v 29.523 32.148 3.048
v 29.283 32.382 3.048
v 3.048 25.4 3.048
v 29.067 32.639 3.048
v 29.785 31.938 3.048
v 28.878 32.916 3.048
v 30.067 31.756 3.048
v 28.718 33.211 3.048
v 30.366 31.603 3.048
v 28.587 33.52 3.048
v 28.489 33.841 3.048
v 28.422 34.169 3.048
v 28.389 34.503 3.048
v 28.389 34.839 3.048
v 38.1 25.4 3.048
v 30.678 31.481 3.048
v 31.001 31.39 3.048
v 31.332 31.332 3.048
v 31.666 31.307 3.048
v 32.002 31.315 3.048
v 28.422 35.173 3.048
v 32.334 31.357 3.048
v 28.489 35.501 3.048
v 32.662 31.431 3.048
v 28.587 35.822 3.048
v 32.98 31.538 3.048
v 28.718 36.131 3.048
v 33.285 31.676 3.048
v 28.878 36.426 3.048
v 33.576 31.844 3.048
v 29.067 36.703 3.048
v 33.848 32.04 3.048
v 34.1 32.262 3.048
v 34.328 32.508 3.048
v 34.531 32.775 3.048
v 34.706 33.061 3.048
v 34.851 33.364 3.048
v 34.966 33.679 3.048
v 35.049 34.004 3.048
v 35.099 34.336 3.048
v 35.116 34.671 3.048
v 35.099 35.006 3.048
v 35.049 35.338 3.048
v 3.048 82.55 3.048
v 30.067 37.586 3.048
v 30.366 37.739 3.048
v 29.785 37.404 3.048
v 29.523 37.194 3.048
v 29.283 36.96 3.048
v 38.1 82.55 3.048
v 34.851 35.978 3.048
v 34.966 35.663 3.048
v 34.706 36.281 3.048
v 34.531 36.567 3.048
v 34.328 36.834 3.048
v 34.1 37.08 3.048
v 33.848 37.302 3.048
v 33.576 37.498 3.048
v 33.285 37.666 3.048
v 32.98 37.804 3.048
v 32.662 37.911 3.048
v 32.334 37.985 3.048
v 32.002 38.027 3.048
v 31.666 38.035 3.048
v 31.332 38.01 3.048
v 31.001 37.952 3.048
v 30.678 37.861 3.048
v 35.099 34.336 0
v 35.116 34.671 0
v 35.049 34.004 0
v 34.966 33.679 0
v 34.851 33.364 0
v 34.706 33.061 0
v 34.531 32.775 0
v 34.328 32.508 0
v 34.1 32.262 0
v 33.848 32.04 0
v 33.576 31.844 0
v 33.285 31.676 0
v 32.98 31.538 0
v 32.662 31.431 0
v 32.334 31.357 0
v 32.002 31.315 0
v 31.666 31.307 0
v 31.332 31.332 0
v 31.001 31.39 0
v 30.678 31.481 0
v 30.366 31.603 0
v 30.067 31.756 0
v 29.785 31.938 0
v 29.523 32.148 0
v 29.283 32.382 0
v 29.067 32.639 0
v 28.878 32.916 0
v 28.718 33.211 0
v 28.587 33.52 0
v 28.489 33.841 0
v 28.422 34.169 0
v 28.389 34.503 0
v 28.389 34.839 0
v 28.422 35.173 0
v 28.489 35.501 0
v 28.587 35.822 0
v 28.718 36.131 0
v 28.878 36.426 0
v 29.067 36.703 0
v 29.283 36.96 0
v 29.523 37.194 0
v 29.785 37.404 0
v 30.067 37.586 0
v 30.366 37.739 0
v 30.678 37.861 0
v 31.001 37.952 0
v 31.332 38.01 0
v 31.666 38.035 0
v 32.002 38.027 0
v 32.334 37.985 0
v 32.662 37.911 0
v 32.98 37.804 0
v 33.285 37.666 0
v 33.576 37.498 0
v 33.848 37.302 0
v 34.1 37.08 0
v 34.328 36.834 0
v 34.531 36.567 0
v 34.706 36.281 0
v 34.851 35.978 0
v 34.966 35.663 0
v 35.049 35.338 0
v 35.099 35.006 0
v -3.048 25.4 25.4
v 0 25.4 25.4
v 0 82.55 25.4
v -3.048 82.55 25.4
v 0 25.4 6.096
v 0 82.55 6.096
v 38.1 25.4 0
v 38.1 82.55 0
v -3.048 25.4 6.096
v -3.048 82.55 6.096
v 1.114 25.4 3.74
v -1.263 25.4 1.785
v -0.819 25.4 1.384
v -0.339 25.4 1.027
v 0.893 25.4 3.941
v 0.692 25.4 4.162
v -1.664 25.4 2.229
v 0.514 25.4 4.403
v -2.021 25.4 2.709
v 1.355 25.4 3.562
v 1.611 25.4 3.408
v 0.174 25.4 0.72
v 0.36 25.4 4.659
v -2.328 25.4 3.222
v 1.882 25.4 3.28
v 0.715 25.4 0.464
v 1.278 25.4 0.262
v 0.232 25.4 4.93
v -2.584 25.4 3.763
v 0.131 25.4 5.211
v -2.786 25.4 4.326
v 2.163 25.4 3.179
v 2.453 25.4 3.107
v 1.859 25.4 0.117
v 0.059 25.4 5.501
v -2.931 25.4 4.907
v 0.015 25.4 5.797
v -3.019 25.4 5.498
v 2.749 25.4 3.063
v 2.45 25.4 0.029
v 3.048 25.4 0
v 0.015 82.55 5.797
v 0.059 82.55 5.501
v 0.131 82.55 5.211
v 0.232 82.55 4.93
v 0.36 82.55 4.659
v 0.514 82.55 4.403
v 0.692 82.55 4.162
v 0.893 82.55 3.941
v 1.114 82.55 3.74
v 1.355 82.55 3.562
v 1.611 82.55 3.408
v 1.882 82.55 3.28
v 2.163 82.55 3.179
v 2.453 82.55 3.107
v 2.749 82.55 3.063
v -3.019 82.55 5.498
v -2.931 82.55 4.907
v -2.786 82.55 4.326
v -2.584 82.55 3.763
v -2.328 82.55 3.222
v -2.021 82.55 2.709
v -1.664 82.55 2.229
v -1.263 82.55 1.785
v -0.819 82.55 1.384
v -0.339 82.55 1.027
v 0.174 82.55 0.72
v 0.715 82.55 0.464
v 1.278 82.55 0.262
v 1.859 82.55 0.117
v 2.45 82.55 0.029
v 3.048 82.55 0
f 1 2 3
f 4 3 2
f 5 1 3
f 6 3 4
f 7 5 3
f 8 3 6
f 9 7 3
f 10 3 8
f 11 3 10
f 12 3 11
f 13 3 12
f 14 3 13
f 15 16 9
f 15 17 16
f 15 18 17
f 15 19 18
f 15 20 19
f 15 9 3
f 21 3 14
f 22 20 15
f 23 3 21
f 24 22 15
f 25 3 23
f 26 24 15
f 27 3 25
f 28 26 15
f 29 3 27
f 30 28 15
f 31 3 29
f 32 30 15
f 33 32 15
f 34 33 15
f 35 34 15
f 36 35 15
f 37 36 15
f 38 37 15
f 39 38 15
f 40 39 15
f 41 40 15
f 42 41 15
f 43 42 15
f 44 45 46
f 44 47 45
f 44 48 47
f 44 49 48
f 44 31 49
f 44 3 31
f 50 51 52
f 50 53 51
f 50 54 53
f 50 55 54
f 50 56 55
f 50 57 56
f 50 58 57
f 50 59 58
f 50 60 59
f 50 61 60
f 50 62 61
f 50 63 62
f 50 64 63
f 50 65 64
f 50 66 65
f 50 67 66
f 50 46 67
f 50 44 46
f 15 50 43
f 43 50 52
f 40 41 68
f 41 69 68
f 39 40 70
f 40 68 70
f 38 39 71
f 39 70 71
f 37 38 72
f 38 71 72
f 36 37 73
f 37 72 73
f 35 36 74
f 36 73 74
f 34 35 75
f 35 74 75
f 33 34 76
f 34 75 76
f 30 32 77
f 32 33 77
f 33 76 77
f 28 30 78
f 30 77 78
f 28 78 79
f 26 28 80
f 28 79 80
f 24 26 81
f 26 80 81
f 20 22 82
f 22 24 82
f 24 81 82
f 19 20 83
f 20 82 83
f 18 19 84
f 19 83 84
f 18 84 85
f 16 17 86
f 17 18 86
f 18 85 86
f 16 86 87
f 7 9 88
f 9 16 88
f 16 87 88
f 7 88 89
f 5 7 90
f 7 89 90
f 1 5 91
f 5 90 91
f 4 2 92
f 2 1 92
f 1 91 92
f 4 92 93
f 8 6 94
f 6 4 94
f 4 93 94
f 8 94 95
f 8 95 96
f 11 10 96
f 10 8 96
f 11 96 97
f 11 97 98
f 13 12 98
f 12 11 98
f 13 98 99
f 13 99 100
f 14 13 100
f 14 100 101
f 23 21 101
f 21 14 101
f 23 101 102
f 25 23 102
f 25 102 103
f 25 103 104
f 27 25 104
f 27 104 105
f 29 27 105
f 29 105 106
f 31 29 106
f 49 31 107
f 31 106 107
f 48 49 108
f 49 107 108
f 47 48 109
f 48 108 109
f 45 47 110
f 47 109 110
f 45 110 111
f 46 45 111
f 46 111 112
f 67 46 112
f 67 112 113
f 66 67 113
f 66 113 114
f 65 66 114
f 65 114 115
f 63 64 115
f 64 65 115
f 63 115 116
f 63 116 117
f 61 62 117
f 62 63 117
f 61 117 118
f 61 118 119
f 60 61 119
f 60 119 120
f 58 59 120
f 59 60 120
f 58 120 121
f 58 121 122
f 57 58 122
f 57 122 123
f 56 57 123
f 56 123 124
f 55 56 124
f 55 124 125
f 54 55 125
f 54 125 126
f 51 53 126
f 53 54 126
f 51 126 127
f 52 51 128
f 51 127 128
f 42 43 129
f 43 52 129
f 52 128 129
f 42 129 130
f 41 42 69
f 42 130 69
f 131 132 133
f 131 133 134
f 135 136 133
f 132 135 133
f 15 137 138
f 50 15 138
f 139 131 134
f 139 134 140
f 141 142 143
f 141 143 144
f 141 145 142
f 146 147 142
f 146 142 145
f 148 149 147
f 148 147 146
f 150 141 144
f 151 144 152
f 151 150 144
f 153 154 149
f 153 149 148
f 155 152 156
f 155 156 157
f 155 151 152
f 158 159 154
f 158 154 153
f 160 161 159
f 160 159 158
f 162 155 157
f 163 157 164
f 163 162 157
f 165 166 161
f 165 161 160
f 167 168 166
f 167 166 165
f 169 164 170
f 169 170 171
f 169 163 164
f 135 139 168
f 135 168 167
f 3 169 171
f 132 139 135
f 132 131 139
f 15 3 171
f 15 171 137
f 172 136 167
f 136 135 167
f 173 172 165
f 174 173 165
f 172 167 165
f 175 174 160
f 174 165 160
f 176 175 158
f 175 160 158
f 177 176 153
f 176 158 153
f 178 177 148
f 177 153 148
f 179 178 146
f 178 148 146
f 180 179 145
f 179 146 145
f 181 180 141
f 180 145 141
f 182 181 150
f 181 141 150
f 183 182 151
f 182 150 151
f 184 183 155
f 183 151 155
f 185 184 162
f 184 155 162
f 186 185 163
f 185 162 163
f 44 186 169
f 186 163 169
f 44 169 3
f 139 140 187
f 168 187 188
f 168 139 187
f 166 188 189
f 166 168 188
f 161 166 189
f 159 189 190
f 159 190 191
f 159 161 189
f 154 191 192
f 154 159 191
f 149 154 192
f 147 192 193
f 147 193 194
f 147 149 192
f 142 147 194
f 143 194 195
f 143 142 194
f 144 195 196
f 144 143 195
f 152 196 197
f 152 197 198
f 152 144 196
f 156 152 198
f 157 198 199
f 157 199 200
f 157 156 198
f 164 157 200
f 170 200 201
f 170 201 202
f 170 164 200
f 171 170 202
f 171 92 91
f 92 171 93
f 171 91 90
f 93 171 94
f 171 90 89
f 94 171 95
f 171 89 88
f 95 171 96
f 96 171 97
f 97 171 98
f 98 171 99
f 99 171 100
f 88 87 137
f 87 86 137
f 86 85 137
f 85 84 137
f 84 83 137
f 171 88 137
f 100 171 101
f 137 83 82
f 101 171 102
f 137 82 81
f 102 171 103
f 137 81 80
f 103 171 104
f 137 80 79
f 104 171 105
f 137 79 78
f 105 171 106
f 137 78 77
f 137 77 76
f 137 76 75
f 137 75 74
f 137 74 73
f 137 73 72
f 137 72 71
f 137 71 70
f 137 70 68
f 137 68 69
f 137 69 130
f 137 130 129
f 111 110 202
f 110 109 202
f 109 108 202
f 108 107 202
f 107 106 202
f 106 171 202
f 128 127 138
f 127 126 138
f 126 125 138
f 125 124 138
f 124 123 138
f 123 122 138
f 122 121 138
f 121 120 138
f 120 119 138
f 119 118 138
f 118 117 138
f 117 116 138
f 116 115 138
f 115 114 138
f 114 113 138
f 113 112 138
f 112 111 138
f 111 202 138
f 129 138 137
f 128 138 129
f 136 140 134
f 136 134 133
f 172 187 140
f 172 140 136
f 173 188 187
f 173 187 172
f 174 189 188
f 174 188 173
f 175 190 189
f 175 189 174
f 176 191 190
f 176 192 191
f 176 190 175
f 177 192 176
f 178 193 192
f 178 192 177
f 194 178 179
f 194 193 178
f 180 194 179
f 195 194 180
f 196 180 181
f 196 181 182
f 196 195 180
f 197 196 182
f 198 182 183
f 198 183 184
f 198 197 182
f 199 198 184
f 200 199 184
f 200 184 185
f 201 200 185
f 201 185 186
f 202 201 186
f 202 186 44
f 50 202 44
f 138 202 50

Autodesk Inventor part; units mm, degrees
ref_plane "YZ Plane" through (0, 0, 0) normal (1, 0, 0) x (0, 1, 0)
ref_plane "XZ Plane" through (0, 0, 0) normal (0, 1, 0) x (-1, 0, 0)
ref_plane "XY Plane" through (0, 0, 0) normal (0, 0, 1) x (1, 0, 0)
sketch "Sketch1" plane through (0, 0, 0) normal (0, 0, 1) x (1, 0, 0)
  line L0 (0, 0) -> (38.1, 0)
  line L1 (38.1, 0) -> (38.1, 253.0348)
  arc A0 (38.1, 507.0348) -> (38.1, 253.0348) centre (666.75, 380.0348) ccw
  line L2 (38.1, 507.0348) -> (38.1, 608.6348)
  line L3 (38.1, 608.6348) -> (0, 608.6348)
  line L4 (0, 608.6348) -> (0, 0)
  circle A1 centre (31.75, 151.4348) radius 3.3655
  circle A2 centre (31.75, 34.671) radius 3.3655
  circle A3 centre (12.7, 12.7) radius 3.3655
  circle A4 centre (12.7, 342.9) radius 3.3655
  circle A5 centre (12.7, 595.9348) radius 3.3655
  circle A6 centre (31.75, 12.7) radius 3.3655
  circle A7 centre (31.75, 253.0348) radius 3.3655
  circle A8 centre (31.75, 507.0348) radius 3.3655
  circle A9 centre (31.75, 595.9348) radius 3.3655
  line L5 (0, 557.8348) -> (0, 608.6348)
  line L6 (0, 50.8) -> (0, 0)
  line L7 (12.7, 342.9) -> (0, 304.3174) construction
  line L8 (0, 317.5) -> (0, 368.3)
  line L9 (0, 129.921) -> (12.7, 129.921) construction
  circle A10 centre (12.7, 129.921) radius 3.3655
  circle A11 centre (12.7, 174.371) radius 3.3655
  line L10 (9.3413, 197.482) -> (9.3413, 204.213)
  line L11 (16.0611, 204.488) -> (16.0611, 197.3435)
  arc A12 (16.0611, 204.488) -> (9.3413, 204.213) centre (12.6956, 204.488) ccw
  arc A13 (9.3413, 197.482) -> (16.0611, 197.3435) centre (12.6974, 197.231) ccw
  circle A14 centre (12.7, 217.188) radius 3.3655
  dimension "d0" = 38.1
  dimension "d2" = 101.6
  dimension "d4" = 457.2
  dimension "d5" = 101.6
  dimension "d6" = 666.75
  dimension "d7" = 641.35
  dimension "d9" = 116.7638
  dimension "d10" = 6.35
  dimension "d11" = 6.35
  dimension "d13" = 12.7
  dimension "d14" = 12.7
  dimension "d16" = 12.7
  dimension "d17" = 342.9
  dimension "d19" = 12.7
  dimension "d20" = 12.7
  dimension "d22" = 6.35
  dimension "d24" = 6.35
  dimension "d25" = 6.731
  dimension "d26" = 6.35
  dimension "hole" = 6.731
  dimension "d28" = 6.35
  dimension "d45" = 12.7
  dimension "d47" = 12.7
  dimension "d54" = 6.731
  dimension "d55" = 3.3655
  dimension "d56" = 3.3655
  dimension "d58" = 6.731
  dimension "d59" = 12.7
  dimension "d68" = 18.22
  dimension "d69" = 90
  dimension "d70" = 90
  dimension "d71" = 22.0389
  dimension "d72" = 28.7587
  dimension "d73" = 478.7138
  dimension "d74" = 6.35
  dimension "d75" = 6.35
  dimension "d76" = 595.9348
  dimension "d77" = 404.1468
  dimension "d78" = 411.2913
  dimension "d79" = 25.4
  dimension "d80" = 25.4
  dimension "d81" = 434.2638
  dimension "d82" = 50.8
  dimension "d83" = 240.3348
  dimension "d84" = 291.1348
  dimension "d85" = 557.8348
extrude "Plate4" add sketch "Sketch1" along normal blind 3.048
sketch "Sketch5" plane through (0, 0, 3.048) normal (0, 0, 1) x (1, 0, 0)
  line L0 (38.1, 0) -> (38.1, 253.0348) projected
  line L1 (0, 0) -> (38.1, 0)
  line L2 (38.1, 0) -> (38.1, 25.4)
  line L3 (38.1, 25.4) -> (0, 25.4)
  line L4 (0, 25.4) -> (0, 0)
  dimension "d96" = 25.4
extrude "Cut1" cut sketch "Sketch5" against normal blind 3.048
sketch "Sketch7" plane through (0, 25.4, 3.048) normal (-1, 0, 0) x (0, -1, 0)
  line L0 (-583.2348, 0) -> (0, 0)
  line L1 (0, 0) -> (0, 22.352)
  line L2 (0, 22.352) -> (-583.2348, 22.352)
  line L3 (-583.2348, 22.352) -> (-583.2348, 0)
edge flange "Flange3" height 25.4 angle 90 thickness 3.048 bend radius 3.048 thickness toward (-1, 0, 0) relief tear relief width 3.048 relief depth 1.524 edges at (0, 317.0174, 3.048) wall of the first edge with corners at (0, 608.6348, 3.048) (0, 25.4, 3.048) (0, 25.4, 25.4) (0, 608.6348, 25.4)
bend "Bend3"
corner "Corner3"
sketch "Sketch8" plane through (38.1, 608.6348, 3.048) normal (0, 1, 0) x (1, 0, 0)
  line L0 (-41.148, -22.352) -> (0, -22.352)
  line L1 (0, -22.352) -> (0, 3.048)
  line L2 (0, 3.048) -> (-41.148, 3.048)
  line L3 (-41.148, 3.048) -> (-41.148, -22.352)
  point P0 (-38.1, 3.048)
extrude "Extrusion1" cut sketch "Sketch8" against normal blind 526.0848
equation "\"d25\" = hole"
equation "\"d97\" = Thickness"
equation "\"d109\" = BendReliefWidth"
equation "\"d110\" = BendReliefDepth"
equation "\"d111\" = MinimumRemnant"
equation "\"d112\" = BendRadius"
equation "\"d115\" = BendRadius"
equation "\"d116\" = CornerReliefSize"
equation "\"d117\" = GapSize"
equation "\"d118\" = JacobiRadiusSize"
equation "\"BendRadius\" = Thickness"
equation "\"BendReliefWidth\" = Thickness"
equation "\"BendReliefDepth\" = 0.5 * Thickness"
equation "\"CornerReliefSize\" = 4 * Thickness"
equation "\"MinimumRemnant\" = 2 * Thickness"
equation "\"TransitionRadius\" = BendRadius"
equation "\"JacobiRadiusSize\" = BendRadius"
equation "\"GapSize\" = Thickness"
equation "\"d29\" = BendRadius"
equation "\"d32\" = BendRadius"
equation "\"d38\" = BendRadius"
equation "\"d60\" = BendRadius"
equation "\"Thickness\" = 3.048"
properties part number "Claw - Arm - Top (R) v3"
